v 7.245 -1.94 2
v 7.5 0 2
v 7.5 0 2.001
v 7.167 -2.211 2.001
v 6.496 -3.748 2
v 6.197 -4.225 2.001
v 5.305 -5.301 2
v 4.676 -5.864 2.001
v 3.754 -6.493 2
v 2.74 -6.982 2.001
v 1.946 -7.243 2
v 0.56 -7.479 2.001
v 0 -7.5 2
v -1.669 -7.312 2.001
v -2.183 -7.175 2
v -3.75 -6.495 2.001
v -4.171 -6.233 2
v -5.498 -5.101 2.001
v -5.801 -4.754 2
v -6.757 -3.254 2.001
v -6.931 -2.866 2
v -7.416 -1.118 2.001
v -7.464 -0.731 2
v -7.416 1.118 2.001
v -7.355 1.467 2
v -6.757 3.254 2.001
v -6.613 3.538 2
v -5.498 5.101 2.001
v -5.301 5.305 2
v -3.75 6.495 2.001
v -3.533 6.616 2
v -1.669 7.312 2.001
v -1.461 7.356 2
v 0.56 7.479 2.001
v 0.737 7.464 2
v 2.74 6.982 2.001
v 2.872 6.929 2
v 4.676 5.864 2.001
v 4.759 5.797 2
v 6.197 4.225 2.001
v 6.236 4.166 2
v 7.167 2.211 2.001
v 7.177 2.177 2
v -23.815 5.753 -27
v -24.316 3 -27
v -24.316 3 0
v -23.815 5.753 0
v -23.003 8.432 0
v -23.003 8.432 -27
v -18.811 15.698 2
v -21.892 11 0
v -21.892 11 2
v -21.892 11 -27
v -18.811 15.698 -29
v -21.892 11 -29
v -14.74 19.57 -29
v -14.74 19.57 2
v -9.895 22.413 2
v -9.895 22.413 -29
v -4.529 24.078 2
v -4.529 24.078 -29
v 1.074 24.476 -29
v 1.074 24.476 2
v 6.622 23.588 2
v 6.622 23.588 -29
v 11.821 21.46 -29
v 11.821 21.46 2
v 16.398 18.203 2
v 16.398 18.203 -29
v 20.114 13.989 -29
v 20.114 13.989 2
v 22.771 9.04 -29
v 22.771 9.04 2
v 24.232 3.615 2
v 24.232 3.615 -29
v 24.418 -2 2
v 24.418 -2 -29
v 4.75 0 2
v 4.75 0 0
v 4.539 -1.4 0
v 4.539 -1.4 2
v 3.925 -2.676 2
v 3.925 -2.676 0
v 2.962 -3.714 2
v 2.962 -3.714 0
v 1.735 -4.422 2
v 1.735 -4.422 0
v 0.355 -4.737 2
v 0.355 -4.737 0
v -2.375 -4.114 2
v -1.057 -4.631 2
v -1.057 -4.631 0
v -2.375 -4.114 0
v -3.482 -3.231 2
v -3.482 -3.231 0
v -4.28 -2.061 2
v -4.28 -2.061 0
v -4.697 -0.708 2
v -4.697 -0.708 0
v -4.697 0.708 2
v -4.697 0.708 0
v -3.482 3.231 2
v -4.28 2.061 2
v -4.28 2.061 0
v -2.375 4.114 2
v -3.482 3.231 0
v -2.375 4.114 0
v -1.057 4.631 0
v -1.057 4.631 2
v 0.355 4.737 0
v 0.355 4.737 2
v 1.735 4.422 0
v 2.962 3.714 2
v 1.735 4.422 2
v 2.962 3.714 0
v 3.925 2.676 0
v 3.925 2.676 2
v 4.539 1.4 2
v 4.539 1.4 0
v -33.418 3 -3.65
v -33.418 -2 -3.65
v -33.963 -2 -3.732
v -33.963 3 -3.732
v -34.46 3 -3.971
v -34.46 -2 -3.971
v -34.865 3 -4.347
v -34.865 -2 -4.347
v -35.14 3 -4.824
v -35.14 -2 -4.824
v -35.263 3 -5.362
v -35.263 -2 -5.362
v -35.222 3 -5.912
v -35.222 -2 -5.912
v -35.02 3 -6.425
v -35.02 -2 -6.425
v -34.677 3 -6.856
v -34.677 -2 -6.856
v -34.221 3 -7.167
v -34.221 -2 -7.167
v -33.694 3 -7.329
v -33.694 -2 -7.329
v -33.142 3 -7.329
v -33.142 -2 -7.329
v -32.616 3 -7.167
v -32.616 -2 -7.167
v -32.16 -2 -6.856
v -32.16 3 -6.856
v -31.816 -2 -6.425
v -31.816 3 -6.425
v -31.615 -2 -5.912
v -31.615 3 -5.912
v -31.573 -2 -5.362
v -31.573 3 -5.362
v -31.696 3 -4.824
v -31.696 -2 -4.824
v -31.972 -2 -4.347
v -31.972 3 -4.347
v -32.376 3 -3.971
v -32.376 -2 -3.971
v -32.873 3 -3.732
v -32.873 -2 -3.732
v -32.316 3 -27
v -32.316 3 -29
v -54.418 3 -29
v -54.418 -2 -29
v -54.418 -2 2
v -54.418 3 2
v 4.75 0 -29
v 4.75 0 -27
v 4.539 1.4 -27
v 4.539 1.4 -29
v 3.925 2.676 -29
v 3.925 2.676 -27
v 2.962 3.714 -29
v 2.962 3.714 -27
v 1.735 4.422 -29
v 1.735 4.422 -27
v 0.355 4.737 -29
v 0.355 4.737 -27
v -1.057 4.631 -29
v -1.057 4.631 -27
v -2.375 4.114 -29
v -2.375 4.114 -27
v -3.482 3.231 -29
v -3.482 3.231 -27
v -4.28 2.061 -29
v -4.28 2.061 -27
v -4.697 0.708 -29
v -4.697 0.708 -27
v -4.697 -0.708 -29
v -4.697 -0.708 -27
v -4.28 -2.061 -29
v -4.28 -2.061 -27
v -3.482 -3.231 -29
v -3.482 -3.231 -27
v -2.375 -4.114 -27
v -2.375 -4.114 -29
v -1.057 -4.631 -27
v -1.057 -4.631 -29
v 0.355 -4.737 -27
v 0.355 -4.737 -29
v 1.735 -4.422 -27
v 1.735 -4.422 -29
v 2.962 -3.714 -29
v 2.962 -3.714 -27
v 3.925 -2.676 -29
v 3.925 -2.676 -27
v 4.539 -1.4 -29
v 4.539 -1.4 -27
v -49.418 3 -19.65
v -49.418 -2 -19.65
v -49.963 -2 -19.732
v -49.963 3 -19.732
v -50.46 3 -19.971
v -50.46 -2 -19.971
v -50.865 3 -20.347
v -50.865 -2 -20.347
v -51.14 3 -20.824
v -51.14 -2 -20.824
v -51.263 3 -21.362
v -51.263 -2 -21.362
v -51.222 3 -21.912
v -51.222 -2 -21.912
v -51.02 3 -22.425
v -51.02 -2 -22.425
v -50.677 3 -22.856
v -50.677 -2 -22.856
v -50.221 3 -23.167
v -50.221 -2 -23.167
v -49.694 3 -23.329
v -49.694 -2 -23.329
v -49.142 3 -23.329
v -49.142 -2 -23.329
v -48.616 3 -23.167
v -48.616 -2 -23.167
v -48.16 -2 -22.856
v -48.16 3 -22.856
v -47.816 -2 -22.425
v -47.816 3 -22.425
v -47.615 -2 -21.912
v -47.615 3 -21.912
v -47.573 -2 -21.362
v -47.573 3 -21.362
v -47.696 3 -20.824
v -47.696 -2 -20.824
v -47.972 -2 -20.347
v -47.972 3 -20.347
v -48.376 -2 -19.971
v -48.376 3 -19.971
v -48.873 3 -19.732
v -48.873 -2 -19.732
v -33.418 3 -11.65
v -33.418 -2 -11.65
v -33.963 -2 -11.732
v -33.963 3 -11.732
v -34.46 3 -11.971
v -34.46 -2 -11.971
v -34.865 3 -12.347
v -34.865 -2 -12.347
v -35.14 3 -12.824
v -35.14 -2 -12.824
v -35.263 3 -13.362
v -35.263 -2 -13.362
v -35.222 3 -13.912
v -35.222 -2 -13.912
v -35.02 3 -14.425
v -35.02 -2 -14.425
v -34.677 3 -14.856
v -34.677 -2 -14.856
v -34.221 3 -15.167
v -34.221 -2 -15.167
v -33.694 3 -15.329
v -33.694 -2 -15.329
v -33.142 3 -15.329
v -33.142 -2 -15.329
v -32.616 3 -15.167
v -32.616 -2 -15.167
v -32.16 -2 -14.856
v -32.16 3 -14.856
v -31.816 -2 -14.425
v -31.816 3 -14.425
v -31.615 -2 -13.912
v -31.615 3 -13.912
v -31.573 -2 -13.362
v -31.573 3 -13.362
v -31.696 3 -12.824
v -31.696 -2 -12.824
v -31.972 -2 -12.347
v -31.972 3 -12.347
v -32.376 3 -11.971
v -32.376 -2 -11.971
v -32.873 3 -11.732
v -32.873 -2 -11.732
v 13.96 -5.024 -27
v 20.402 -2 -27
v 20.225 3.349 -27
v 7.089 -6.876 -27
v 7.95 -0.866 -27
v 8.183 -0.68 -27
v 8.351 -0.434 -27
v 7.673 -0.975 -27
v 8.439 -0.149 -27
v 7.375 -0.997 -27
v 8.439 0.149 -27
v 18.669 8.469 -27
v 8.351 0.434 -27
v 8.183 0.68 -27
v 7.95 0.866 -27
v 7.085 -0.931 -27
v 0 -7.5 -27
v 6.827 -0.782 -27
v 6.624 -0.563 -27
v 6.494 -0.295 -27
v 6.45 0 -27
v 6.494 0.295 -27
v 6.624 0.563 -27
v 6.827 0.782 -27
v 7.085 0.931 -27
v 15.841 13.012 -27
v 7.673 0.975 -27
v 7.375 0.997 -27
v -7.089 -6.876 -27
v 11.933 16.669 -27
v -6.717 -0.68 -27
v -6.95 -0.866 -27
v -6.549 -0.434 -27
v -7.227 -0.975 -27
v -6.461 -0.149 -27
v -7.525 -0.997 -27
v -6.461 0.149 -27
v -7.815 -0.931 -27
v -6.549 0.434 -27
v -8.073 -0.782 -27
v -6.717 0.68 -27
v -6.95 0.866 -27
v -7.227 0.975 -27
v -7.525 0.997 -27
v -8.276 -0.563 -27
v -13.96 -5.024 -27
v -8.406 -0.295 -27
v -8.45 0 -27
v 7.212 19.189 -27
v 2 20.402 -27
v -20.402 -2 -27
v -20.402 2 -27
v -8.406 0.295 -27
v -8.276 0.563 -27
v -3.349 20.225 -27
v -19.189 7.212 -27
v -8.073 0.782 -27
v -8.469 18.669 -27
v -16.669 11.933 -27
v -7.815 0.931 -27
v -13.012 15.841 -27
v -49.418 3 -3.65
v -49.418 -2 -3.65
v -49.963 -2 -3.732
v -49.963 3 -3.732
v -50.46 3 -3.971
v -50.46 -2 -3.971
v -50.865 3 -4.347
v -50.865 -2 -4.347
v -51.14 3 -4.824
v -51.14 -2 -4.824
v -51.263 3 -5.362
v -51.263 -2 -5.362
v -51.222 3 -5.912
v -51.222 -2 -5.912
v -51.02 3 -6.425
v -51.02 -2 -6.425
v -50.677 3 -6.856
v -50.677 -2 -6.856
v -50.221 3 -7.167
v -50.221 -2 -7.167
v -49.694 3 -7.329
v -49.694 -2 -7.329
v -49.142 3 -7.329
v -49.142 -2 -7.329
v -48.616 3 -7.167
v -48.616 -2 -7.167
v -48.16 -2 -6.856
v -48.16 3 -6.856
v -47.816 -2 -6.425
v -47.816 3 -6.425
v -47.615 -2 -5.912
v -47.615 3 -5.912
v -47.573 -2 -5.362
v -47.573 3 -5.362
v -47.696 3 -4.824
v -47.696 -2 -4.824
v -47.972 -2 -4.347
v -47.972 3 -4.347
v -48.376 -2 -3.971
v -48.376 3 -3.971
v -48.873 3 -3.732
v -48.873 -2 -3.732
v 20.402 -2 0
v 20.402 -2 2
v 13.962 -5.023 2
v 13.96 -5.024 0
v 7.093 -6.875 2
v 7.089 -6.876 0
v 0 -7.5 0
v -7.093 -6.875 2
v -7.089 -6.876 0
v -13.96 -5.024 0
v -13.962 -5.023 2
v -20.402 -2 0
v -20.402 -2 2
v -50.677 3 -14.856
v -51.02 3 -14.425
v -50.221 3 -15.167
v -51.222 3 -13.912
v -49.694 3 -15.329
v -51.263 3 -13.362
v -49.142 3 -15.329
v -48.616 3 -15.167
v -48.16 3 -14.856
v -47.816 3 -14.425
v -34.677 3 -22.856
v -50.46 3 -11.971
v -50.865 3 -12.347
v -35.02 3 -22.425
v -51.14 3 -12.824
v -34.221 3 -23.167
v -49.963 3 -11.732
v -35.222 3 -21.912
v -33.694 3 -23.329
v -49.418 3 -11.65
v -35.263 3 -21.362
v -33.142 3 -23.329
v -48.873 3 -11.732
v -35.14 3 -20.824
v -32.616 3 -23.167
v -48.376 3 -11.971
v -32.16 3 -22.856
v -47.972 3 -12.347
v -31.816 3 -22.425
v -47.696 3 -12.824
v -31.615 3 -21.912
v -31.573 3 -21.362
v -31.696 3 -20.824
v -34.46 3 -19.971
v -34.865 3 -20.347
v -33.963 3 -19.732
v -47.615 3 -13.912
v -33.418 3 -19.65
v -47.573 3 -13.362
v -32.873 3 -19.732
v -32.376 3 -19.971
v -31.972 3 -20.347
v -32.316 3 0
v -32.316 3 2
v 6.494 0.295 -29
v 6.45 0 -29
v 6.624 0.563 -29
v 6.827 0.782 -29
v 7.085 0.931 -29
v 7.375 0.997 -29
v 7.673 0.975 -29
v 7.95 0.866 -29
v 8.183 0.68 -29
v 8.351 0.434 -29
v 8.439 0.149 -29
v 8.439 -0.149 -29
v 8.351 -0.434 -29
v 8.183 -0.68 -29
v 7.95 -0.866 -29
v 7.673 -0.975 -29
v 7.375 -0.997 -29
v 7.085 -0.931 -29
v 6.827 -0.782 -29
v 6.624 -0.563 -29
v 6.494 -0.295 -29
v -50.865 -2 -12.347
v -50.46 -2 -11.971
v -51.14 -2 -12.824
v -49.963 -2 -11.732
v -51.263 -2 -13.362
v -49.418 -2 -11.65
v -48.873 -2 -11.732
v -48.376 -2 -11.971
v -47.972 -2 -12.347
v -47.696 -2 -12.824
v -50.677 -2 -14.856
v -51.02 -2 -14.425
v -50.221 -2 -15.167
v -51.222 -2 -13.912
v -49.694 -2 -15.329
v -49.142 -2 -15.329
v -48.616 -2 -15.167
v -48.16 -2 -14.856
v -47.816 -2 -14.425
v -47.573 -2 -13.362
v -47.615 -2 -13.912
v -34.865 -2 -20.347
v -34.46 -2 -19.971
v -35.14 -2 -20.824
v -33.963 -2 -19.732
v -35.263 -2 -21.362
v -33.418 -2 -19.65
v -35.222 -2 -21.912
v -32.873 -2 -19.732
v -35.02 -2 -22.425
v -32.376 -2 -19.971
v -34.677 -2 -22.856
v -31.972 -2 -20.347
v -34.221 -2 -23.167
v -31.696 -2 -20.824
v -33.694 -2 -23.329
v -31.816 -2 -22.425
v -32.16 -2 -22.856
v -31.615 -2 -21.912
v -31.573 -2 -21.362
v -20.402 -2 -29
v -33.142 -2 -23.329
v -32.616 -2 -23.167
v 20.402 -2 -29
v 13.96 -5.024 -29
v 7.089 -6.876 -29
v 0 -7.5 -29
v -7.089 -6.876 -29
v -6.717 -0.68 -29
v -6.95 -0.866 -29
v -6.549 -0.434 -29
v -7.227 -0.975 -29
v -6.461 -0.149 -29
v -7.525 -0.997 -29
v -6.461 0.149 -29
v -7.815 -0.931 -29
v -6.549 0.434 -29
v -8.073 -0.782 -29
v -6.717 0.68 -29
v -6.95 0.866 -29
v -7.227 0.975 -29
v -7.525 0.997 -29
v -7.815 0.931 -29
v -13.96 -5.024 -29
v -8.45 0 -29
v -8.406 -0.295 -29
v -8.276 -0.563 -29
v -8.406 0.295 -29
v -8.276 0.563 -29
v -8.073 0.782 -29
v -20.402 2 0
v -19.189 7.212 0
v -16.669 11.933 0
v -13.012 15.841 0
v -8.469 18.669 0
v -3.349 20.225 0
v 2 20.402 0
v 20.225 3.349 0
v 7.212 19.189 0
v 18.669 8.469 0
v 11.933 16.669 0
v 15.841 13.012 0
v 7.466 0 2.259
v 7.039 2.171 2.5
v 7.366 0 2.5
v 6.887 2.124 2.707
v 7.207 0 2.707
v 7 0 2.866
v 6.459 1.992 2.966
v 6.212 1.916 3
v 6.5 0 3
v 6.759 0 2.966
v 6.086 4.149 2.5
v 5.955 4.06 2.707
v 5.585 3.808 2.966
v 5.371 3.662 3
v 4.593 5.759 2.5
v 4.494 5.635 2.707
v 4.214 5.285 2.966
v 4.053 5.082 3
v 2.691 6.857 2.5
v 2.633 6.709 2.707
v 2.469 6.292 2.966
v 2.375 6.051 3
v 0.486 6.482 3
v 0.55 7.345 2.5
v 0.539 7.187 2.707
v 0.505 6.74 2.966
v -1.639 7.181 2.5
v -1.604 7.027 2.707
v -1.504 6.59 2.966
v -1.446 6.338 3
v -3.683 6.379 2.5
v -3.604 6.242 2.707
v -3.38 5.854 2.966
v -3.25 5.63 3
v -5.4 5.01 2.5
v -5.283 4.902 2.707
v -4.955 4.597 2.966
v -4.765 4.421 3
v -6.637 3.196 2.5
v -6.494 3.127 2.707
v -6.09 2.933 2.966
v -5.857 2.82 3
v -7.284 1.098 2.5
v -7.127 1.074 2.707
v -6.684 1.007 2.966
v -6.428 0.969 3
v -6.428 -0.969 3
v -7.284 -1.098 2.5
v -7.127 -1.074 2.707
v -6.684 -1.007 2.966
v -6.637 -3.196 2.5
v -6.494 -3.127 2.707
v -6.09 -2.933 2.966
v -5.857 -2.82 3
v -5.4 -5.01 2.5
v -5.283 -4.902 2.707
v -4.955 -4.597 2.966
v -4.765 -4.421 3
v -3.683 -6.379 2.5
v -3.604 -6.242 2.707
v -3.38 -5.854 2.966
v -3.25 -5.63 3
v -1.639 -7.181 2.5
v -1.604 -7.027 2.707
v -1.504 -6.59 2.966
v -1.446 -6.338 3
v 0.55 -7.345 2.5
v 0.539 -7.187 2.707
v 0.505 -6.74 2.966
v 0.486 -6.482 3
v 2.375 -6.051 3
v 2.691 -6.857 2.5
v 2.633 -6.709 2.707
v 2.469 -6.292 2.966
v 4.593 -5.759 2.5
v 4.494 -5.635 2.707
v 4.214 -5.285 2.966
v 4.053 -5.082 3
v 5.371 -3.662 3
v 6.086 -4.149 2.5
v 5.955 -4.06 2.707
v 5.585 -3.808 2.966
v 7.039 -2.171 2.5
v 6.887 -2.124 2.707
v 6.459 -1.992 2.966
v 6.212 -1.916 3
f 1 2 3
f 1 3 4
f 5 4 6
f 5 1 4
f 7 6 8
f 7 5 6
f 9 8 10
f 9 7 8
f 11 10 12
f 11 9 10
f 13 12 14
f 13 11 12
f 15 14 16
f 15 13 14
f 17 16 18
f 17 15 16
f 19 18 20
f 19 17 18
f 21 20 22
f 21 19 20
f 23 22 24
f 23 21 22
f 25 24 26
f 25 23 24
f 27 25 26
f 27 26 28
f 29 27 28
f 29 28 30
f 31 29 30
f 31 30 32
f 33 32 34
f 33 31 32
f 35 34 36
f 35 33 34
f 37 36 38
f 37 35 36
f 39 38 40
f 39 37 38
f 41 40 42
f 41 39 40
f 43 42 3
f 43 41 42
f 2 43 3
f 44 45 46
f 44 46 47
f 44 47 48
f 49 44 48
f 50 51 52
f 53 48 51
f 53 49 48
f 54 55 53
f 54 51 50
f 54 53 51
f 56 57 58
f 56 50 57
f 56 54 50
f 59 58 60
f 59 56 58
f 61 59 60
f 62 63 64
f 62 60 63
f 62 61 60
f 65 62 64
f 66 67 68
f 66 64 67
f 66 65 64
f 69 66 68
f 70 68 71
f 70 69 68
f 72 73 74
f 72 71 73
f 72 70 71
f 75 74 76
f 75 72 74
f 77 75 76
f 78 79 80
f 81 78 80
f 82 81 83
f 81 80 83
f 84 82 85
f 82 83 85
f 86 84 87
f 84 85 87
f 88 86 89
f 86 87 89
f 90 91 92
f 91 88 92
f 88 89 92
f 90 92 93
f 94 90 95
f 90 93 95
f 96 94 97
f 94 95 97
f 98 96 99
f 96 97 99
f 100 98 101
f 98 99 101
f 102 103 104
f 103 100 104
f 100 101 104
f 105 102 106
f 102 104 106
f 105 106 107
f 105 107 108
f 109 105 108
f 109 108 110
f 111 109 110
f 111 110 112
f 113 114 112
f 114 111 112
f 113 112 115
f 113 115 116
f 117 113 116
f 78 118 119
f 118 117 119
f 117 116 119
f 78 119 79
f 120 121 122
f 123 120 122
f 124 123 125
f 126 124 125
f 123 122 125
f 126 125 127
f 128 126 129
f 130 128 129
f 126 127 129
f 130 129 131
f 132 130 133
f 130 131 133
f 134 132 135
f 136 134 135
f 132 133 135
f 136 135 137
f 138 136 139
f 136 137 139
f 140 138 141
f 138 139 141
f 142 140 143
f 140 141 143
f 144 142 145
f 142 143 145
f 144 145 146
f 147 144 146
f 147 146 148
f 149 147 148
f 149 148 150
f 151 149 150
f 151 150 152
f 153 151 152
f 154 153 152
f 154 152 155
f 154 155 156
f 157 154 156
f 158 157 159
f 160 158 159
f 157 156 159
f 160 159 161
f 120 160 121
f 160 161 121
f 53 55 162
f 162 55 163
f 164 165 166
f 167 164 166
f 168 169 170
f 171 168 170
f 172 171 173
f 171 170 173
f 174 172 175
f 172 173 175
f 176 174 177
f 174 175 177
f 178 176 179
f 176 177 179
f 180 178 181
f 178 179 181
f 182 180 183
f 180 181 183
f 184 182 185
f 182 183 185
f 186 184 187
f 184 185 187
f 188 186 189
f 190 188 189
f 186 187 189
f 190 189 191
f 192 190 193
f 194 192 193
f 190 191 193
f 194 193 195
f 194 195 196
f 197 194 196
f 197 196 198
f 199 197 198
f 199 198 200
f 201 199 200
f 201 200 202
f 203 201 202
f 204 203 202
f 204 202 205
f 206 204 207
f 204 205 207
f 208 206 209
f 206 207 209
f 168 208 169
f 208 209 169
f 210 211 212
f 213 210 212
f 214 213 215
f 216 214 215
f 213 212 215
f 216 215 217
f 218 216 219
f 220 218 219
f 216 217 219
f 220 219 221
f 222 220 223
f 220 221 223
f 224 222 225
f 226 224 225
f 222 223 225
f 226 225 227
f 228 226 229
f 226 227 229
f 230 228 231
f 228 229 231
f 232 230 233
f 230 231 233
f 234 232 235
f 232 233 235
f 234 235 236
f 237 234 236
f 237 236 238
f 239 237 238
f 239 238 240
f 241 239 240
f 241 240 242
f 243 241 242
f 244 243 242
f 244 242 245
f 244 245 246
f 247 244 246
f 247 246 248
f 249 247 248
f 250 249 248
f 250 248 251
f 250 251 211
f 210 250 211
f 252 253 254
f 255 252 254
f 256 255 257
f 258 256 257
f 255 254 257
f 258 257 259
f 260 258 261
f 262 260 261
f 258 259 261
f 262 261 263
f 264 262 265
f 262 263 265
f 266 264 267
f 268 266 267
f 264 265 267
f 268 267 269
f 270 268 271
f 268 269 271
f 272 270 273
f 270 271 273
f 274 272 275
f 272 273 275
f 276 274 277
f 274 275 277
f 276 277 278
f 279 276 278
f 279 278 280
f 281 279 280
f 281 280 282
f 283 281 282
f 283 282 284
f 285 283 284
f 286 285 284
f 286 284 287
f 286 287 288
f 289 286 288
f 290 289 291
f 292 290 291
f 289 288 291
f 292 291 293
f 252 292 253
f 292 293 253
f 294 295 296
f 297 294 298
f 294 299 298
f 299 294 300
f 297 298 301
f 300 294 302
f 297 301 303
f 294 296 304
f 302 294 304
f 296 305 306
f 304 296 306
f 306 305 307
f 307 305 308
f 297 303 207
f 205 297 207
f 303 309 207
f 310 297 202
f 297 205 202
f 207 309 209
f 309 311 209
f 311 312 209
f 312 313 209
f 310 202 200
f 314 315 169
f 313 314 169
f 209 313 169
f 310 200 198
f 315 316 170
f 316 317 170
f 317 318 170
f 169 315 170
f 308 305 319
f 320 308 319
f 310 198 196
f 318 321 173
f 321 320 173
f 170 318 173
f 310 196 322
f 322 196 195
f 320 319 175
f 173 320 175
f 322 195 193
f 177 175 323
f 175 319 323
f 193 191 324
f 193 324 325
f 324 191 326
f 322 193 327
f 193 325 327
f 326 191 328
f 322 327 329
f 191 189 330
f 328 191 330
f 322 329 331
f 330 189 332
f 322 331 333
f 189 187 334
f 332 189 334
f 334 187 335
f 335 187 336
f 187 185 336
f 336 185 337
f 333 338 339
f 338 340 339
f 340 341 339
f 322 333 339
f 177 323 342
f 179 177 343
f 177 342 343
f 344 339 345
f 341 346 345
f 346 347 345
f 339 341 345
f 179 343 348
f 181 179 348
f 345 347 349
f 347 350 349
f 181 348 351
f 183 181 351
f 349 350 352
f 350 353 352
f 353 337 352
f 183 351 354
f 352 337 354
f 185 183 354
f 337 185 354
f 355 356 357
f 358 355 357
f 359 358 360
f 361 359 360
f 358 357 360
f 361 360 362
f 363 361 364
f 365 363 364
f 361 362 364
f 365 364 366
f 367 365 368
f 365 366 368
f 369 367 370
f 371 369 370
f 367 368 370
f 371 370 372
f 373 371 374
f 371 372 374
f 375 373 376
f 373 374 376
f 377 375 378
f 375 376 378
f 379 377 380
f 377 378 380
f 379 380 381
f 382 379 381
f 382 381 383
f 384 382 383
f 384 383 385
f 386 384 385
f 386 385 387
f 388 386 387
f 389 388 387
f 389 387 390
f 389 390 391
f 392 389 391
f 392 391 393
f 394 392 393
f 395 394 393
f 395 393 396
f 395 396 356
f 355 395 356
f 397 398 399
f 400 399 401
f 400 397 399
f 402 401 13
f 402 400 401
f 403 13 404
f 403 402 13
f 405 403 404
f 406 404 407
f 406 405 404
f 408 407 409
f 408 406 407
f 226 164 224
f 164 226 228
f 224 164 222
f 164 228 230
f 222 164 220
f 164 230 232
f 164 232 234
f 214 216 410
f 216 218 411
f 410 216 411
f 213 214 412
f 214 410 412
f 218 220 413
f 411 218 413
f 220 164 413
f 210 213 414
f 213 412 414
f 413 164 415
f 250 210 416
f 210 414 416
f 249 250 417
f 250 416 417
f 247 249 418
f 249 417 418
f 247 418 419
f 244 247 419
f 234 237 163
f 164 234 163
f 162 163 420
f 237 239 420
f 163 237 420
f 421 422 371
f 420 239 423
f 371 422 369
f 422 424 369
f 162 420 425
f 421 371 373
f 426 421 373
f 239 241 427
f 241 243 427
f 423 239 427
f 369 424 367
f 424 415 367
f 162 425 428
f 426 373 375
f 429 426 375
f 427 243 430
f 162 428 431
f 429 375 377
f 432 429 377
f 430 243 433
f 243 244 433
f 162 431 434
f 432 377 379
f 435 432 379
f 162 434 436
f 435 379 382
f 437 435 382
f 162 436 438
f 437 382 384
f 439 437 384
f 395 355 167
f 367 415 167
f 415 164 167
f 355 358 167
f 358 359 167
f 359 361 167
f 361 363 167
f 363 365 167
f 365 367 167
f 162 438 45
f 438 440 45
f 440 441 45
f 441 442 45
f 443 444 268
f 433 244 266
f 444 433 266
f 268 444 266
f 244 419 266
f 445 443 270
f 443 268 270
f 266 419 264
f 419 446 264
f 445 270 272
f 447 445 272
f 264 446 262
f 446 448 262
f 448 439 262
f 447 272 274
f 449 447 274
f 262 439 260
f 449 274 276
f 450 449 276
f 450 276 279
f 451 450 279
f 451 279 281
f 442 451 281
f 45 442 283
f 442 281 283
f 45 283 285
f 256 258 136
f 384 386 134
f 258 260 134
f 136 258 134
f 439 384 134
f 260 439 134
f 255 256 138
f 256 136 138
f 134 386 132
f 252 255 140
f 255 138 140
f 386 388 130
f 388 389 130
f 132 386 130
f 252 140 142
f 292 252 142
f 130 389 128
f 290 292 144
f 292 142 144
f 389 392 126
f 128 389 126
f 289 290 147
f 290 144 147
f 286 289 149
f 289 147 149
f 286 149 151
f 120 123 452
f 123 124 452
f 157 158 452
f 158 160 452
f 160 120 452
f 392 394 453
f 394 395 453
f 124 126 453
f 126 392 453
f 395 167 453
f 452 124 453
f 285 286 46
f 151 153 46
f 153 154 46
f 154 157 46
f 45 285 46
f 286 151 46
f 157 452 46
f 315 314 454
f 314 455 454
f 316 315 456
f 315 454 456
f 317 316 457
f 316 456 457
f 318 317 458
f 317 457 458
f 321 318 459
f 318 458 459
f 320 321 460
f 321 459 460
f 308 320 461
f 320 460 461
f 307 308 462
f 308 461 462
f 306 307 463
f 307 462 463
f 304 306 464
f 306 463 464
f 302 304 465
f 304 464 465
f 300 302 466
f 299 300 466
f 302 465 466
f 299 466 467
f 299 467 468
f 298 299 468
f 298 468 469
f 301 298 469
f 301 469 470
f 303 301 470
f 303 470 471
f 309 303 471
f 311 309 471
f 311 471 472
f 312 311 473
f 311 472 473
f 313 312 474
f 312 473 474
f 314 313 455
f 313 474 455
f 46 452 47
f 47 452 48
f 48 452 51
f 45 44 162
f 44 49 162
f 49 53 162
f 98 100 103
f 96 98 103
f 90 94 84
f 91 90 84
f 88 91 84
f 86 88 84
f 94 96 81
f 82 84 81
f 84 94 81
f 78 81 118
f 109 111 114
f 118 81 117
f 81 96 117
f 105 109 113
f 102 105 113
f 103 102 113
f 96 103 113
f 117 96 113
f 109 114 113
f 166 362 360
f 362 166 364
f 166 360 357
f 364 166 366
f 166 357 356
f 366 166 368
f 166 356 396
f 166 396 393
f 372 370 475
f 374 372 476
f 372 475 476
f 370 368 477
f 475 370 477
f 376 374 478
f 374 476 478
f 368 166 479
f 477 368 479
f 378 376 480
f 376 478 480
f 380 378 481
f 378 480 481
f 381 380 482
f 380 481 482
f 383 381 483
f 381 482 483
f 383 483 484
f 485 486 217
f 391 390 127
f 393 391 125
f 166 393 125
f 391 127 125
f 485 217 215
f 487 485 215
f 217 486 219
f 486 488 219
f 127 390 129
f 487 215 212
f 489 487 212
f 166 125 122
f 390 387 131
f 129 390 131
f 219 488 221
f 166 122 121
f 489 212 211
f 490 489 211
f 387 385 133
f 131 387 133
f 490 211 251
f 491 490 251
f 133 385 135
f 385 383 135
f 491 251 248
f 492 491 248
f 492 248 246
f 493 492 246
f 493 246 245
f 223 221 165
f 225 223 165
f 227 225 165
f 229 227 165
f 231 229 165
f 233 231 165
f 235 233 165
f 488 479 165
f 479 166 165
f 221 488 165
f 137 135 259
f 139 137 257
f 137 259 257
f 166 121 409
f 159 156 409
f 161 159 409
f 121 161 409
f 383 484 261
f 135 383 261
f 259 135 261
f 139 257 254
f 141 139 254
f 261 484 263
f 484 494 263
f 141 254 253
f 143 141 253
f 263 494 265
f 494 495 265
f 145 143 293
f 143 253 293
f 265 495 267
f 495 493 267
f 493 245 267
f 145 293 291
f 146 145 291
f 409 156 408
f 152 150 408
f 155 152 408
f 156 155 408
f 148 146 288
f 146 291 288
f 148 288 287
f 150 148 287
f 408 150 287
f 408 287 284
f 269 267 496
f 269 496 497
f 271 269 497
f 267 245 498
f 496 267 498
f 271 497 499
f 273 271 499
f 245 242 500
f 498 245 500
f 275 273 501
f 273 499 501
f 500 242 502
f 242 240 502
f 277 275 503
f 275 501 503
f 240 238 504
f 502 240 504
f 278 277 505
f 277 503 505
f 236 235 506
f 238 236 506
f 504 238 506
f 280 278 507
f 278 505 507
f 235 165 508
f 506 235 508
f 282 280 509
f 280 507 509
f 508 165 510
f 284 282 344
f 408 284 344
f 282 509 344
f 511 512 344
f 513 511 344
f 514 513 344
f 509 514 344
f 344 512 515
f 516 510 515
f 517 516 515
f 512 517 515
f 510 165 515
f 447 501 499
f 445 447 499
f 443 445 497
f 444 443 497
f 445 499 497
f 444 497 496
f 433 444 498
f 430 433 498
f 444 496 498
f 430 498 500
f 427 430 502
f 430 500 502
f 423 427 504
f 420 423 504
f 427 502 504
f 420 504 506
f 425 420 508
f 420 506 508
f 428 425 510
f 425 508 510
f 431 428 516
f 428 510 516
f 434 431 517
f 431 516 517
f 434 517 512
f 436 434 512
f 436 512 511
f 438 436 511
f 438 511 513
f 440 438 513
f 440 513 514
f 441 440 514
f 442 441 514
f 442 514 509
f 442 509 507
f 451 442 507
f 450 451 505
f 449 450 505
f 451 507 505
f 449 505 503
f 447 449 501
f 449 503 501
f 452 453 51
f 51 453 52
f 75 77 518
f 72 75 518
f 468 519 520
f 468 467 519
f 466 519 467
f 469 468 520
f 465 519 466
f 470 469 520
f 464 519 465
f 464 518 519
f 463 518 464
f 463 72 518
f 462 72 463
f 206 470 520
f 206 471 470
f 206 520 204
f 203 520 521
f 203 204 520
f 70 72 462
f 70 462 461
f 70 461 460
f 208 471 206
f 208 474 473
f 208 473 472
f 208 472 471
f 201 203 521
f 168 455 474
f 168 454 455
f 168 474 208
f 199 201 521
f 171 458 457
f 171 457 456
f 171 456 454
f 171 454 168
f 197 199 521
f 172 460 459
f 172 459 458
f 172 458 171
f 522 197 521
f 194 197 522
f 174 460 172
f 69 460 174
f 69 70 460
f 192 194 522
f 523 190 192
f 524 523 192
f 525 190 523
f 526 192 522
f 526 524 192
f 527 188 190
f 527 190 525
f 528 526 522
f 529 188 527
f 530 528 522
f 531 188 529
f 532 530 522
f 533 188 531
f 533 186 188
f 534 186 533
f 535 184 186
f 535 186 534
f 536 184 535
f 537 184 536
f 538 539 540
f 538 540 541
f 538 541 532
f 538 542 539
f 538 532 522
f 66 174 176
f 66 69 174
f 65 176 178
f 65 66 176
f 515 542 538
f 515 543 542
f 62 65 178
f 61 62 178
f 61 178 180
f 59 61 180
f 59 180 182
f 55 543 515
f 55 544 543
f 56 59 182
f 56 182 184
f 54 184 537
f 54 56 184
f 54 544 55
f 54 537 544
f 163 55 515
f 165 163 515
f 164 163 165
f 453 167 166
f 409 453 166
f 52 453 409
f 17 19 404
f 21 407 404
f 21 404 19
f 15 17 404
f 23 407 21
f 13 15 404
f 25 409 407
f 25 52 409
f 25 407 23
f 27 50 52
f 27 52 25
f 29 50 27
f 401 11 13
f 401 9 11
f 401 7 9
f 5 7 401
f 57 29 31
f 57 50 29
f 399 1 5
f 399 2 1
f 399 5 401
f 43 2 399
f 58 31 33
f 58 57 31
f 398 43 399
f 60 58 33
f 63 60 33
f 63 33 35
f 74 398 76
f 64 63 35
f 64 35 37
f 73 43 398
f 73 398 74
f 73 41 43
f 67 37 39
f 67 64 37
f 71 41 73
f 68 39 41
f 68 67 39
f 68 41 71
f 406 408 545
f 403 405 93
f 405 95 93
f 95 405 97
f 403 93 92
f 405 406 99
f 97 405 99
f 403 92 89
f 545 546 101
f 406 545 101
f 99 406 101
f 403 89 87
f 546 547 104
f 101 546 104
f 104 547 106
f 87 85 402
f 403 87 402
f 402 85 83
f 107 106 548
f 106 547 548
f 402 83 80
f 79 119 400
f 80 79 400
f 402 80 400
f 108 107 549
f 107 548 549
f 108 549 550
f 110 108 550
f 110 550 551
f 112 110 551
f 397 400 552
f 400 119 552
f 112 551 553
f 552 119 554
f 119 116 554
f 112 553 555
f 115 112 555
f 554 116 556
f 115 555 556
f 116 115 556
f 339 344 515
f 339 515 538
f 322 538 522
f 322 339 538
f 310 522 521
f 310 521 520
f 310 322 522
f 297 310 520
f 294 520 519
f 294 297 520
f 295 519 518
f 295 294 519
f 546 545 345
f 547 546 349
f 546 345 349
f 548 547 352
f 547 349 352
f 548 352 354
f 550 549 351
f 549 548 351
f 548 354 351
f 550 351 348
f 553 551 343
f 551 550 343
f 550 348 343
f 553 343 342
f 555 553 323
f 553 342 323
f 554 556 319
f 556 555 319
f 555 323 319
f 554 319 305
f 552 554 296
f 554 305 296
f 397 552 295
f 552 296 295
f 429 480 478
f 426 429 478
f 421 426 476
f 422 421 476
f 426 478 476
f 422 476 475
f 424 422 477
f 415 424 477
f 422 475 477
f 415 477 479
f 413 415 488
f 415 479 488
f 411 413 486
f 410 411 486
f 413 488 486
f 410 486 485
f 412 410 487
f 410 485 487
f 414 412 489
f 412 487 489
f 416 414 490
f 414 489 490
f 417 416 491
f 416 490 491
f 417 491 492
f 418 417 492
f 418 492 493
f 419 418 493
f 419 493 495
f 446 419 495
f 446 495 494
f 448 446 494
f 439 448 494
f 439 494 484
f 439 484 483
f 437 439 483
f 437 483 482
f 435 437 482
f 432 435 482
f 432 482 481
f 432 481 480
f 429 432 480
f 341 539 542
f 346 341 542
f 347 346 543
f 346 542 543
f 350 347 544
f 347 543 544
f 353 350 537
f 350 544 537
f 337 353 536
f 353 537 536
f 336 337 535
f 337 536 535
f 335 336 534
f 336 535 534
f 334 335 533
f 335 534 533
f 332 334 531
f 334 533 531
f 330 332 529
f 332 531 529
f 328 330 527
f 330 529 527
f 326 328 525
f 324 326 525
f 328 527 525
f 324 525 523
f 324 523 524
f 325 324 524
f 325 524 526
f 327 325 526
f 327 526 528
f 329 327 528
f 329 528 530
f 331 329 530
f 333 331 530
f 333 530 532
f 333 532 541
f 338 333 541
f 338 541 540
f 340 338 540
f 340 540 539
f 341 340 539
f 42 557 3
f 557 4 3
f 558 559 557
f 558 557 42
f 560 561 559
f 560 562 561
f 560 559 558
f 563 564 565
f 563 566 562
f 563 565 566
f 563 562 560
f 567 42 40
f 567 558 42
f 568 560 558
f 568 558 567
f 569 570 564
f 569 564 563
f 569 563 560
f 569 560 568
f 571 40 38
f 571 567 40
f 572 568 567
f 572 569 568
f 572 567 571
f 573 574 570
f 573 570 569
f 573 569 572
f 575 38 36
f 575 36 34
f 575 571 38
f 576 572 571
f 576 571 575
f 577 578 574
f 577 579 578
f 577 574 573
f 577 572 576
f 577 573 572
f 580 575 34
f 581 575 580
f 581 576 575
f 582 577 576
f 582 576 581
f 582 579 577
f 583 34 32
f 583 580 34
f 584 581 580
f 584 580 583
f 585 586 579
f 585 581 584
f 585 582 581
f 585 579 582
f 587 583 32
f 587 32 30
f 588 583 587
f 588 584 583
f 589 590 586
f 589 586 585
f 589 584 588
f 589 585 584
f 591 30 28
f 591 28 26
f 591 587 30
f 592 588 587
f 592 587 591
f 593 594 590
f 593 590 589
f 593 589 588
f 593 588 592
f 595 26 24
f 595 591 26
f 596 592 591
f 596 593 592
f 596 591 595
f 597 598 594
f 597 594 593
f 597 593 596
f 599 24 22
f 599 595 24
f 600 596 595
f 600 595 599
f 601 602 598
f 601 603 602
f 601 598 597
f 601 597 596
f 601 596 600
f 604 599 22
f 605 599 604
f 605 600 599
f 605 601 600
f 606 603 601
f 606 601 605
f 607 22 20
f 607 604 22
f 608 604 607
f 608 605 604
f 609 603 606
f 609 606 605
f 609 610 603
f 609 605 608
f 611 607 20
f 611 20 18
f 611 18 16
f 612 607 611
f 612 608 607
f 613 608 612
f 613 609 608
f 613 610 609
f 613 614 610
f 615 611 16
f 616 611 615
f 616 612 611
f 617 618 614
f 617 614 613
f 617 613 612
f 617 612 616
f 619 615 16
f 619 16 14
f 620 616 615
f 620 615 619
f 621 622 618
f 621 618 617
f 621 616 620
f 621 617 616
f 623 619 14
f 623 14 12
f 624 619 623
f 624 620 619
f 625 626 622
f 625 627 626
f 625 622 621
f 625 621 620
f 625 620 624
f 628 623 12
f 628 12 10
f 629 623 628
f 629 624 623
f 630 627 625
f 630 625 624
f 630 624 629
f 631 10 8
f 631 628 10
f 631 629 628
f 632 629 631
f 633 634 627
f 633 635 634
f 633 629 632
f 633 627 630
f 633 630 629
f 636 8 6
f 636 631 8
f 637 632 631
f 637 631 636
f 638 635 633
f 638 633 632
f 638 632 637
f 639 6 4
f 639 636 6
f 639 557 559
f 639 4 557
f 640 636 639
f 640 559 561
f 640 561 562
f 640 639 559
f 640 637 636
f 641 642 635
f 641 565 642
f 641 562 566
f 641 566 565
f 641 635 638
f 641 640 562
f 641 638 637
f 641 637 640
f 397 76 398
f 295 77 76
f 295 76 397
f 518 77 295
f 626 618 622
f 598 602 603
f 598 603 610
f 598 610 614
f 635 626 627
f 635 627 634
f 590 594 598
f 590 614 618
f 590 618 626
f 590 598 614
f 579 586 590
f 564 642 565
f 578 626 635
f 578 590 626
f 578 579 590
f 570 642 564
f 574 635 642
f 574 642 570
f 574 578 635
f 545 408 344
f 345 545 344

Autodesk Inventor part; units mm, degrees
ref_plane "YZ Plane" through (0, 0, 0) normal (1, 0, 0) x (0, 1, 0)
ref_plane "XZ Plane" through (0, 0, 0) normal (0, 1, 0) x (-1, 0, 0)
sketch "Sketch1" plane through (0, 0, 0) normal (0, 0, 1) x (1, 0, 0)
  circle A0 centre (0, 0) radius 4.75
  circle A1 centre (0, 0) radius 17.5 construction
  arc A2 (20.4022, -2) -> (-20.4022, -2) centre (0, 0) ccw
  arc A3 (-20.4022, -2) -> (20.4022, -2) centre (0, 33.0909) ccw
  arc A4 (-20.4022, -2) -> (20.4022, -2) centre (0, 0) ccw construction
  arc A5 (24.4182, -2) -> (-24.4182, -2) centre (0, 0) ccw
  line L0 (-20.4022, -2) -> (-24.4182, -2)
  line L1 (20.4022, -2) -> (24.4182, -2)
  arc A6 (-24.4182, -2) -> (24.4182, -2) centre (0, 0) ccw construction
  dimension "d0" = 9.5
  dimension "d1" = 35
  dimension "d2" = 41
  dimension "d3" = 10
  dimension "d4" = 2
  dimension "d5" = 49
extrude "Extrusion1" add sketch "Sketch1" along normal blind 2
extrude "Extrusion2" add sketch "Sketch1" against normal blind 13.5 contours A2 L0 A5 L1
mirror "Mirror1" about plane through (0, 12.5652, -13.5) normal (0, 0, -1) of "Extrusion1", "Extrusion2"
sketch "Sketch2" plane through (0, 0, -29) normal (0, 0, -1) x (-1, 0, 0)
  circle A0 centre (0, 0) radius 7.45
  circle A1 centre (7.45, 0) radius 1
  circle A2 centre (-7.45, 0) radius 1
  point P0 (0, 7.45)
  dimension "d10" = 14.9
  dimension "d11" = 2
  dimension "d14" = 360
  dimension "d16" = 90
extrude "Extrusion3" cut sketch "Sketch2" against normal up to surface (2 mm away) contours A0 A1 | A0 A1 | A2 A0 | A0 A2
sketch "Sketch3" plane through (0, 0, 2) normal (0, 0, 1) x (1, 0, 0)
  circle A0 centre (0, 0) radius 7.5
  dimension "d19" = 15
extrude "Extrusion4" add sketch "Sketch3" along normal blind 1
fillet "Fillet1" radius 1 1 edges at (-7.5, 0, 3)
sketch "Sketch7" plane through (-24.4182, -2, 2) normal (0, -1, 0) x (1, 0, 0)
  line L0 (4.016, -2) -> (4.016, 0) projected
  line L1 (0, 0) -> (4.016, 0) projected
  line L2 (0, -31) -> (0, 0) projected
  line L3 (0, -31) -> (4.016, -31) projected
  line L4 (4.016, -29) -> (4.016, -31) projected
  line L5 (4.016, -2) -> (4.016, -29) projected
  line L6 (44.8204, -31) -> (4.016, -31) projected
  line L7 (4.016, -31) -> (-30, -31)
  line L8 (-30, -31) -> (-30, 0)
  line L9 (-30, 0) -> (4.016, 0)
  line L10 (4.016, 0) -> (4.016, -31)
  point P0 (24.4182, -2)
  dimension "d36" = 30
extrude "Extrusion8" add sketch "Sketch7" against normal blind 5
sketch "Sketch8" plane through (0, 33.0909, -29) normal (0, 0, -1) x (-1, 0, 0)
  arc A0 (24.3156, -30.0909) -> (-24.4182, -35.0909) centre (0, -33.0909) ccw projected
  line L0 (-20.4022, -35.0909) -> (-24.4182, -35.0909) projected
  arc A1 (-20.4022, -35.0909) -> (20.4022, -35.0909) centre (0, 0) ccw projected
  line L1 (54.4182, -35.0909) -> (20.4022, -35.0909) projected
  line L2 (54.4182, -35.0909) -> (54.4182, -30.0909) projected
  line L3 (24.3156, -30.0909) -> (54.4182, -30.0909) projected
  circle A2 centre (-7.45, -33.0909) radius 1 projected
  circle A3 centre (7.45, -33.0909) radius 1 projected
  circle A4 centre (0, -33.0909) radius 4.75 projected
  arc A5 (24.3156, -30.0909) -> (-24.4182, -35.0909) centre (0, -33.0909) ccw projected
  line L4 (21.8918, -22.0909) -> (32.3156, -30.0909)
  line L5 (54.4182, -30.0909) -> (24.3156, -30.0909) projected
  dimension "d39" = 8
  dimension "d40" = 8
extrude "Extrusion9" add sketch "Sketch8" against normal blind 2 contours A0 L4 L3
ref_plane "Work Plane2" through (0, 0, -13.5) normal (0, 0, 1) x (1, 0, 0)
mirror "Mirror4" about plane through (0, 0, -13.5) normal (0, 0, 1) of "Extrusion9"
sketch "Sketch9" plane through (-24.4182, 3, 2) normal (0, 1, 0) x (1, 0, 0)
  line L0 (-7.8974, 0) -> (-7.8974, 2) projected
  line L1 (-7.8974, 2) -> (0.1026, 2) projected
  line L2 (0.1026, 29) -> (0.1026, 2) projected
  line L3 (0.1026, 29) -> (-7.8974, 29) projected
  line L4 (-7.8974, 29) -> (-7.8974, 31) projected
  line L5 (-7.8974, 31) -> (-30, 31) projected
  line L6 (-30, 31) -> (-30, 0) projected
  line L7 (-30, 0) -> (-7.8974, 0) projected
  point P0 (24.4182, 2)
  point P1 (-25, 7.5)
  point P2 (-25, 15.5)
  point P3 (-25, 23.5)
  point P4 (-9, 7.5)
  point P5 (-9, 15.5)
  point P6 (-9, 23.5)
  dimension "d45" = 8
  dimension "d48" = 16
  dimension "d51" = 31
  dimension "d52" = 7.5
  dimension "d53" = 5
hole "Hole1" at (-49.4182, 3, -5.5) at (-49.4182, 3, -13.5) at (-49.4182, 3, -21.5) at (-33.4182, 3, -5.5) at (-33.4182, 3, -13.5) at (-33.4182, 3, -21.5) direction (0, -1, 0) diameter 3.7 end through all
properties part number "Omni Encoder-trackers"
